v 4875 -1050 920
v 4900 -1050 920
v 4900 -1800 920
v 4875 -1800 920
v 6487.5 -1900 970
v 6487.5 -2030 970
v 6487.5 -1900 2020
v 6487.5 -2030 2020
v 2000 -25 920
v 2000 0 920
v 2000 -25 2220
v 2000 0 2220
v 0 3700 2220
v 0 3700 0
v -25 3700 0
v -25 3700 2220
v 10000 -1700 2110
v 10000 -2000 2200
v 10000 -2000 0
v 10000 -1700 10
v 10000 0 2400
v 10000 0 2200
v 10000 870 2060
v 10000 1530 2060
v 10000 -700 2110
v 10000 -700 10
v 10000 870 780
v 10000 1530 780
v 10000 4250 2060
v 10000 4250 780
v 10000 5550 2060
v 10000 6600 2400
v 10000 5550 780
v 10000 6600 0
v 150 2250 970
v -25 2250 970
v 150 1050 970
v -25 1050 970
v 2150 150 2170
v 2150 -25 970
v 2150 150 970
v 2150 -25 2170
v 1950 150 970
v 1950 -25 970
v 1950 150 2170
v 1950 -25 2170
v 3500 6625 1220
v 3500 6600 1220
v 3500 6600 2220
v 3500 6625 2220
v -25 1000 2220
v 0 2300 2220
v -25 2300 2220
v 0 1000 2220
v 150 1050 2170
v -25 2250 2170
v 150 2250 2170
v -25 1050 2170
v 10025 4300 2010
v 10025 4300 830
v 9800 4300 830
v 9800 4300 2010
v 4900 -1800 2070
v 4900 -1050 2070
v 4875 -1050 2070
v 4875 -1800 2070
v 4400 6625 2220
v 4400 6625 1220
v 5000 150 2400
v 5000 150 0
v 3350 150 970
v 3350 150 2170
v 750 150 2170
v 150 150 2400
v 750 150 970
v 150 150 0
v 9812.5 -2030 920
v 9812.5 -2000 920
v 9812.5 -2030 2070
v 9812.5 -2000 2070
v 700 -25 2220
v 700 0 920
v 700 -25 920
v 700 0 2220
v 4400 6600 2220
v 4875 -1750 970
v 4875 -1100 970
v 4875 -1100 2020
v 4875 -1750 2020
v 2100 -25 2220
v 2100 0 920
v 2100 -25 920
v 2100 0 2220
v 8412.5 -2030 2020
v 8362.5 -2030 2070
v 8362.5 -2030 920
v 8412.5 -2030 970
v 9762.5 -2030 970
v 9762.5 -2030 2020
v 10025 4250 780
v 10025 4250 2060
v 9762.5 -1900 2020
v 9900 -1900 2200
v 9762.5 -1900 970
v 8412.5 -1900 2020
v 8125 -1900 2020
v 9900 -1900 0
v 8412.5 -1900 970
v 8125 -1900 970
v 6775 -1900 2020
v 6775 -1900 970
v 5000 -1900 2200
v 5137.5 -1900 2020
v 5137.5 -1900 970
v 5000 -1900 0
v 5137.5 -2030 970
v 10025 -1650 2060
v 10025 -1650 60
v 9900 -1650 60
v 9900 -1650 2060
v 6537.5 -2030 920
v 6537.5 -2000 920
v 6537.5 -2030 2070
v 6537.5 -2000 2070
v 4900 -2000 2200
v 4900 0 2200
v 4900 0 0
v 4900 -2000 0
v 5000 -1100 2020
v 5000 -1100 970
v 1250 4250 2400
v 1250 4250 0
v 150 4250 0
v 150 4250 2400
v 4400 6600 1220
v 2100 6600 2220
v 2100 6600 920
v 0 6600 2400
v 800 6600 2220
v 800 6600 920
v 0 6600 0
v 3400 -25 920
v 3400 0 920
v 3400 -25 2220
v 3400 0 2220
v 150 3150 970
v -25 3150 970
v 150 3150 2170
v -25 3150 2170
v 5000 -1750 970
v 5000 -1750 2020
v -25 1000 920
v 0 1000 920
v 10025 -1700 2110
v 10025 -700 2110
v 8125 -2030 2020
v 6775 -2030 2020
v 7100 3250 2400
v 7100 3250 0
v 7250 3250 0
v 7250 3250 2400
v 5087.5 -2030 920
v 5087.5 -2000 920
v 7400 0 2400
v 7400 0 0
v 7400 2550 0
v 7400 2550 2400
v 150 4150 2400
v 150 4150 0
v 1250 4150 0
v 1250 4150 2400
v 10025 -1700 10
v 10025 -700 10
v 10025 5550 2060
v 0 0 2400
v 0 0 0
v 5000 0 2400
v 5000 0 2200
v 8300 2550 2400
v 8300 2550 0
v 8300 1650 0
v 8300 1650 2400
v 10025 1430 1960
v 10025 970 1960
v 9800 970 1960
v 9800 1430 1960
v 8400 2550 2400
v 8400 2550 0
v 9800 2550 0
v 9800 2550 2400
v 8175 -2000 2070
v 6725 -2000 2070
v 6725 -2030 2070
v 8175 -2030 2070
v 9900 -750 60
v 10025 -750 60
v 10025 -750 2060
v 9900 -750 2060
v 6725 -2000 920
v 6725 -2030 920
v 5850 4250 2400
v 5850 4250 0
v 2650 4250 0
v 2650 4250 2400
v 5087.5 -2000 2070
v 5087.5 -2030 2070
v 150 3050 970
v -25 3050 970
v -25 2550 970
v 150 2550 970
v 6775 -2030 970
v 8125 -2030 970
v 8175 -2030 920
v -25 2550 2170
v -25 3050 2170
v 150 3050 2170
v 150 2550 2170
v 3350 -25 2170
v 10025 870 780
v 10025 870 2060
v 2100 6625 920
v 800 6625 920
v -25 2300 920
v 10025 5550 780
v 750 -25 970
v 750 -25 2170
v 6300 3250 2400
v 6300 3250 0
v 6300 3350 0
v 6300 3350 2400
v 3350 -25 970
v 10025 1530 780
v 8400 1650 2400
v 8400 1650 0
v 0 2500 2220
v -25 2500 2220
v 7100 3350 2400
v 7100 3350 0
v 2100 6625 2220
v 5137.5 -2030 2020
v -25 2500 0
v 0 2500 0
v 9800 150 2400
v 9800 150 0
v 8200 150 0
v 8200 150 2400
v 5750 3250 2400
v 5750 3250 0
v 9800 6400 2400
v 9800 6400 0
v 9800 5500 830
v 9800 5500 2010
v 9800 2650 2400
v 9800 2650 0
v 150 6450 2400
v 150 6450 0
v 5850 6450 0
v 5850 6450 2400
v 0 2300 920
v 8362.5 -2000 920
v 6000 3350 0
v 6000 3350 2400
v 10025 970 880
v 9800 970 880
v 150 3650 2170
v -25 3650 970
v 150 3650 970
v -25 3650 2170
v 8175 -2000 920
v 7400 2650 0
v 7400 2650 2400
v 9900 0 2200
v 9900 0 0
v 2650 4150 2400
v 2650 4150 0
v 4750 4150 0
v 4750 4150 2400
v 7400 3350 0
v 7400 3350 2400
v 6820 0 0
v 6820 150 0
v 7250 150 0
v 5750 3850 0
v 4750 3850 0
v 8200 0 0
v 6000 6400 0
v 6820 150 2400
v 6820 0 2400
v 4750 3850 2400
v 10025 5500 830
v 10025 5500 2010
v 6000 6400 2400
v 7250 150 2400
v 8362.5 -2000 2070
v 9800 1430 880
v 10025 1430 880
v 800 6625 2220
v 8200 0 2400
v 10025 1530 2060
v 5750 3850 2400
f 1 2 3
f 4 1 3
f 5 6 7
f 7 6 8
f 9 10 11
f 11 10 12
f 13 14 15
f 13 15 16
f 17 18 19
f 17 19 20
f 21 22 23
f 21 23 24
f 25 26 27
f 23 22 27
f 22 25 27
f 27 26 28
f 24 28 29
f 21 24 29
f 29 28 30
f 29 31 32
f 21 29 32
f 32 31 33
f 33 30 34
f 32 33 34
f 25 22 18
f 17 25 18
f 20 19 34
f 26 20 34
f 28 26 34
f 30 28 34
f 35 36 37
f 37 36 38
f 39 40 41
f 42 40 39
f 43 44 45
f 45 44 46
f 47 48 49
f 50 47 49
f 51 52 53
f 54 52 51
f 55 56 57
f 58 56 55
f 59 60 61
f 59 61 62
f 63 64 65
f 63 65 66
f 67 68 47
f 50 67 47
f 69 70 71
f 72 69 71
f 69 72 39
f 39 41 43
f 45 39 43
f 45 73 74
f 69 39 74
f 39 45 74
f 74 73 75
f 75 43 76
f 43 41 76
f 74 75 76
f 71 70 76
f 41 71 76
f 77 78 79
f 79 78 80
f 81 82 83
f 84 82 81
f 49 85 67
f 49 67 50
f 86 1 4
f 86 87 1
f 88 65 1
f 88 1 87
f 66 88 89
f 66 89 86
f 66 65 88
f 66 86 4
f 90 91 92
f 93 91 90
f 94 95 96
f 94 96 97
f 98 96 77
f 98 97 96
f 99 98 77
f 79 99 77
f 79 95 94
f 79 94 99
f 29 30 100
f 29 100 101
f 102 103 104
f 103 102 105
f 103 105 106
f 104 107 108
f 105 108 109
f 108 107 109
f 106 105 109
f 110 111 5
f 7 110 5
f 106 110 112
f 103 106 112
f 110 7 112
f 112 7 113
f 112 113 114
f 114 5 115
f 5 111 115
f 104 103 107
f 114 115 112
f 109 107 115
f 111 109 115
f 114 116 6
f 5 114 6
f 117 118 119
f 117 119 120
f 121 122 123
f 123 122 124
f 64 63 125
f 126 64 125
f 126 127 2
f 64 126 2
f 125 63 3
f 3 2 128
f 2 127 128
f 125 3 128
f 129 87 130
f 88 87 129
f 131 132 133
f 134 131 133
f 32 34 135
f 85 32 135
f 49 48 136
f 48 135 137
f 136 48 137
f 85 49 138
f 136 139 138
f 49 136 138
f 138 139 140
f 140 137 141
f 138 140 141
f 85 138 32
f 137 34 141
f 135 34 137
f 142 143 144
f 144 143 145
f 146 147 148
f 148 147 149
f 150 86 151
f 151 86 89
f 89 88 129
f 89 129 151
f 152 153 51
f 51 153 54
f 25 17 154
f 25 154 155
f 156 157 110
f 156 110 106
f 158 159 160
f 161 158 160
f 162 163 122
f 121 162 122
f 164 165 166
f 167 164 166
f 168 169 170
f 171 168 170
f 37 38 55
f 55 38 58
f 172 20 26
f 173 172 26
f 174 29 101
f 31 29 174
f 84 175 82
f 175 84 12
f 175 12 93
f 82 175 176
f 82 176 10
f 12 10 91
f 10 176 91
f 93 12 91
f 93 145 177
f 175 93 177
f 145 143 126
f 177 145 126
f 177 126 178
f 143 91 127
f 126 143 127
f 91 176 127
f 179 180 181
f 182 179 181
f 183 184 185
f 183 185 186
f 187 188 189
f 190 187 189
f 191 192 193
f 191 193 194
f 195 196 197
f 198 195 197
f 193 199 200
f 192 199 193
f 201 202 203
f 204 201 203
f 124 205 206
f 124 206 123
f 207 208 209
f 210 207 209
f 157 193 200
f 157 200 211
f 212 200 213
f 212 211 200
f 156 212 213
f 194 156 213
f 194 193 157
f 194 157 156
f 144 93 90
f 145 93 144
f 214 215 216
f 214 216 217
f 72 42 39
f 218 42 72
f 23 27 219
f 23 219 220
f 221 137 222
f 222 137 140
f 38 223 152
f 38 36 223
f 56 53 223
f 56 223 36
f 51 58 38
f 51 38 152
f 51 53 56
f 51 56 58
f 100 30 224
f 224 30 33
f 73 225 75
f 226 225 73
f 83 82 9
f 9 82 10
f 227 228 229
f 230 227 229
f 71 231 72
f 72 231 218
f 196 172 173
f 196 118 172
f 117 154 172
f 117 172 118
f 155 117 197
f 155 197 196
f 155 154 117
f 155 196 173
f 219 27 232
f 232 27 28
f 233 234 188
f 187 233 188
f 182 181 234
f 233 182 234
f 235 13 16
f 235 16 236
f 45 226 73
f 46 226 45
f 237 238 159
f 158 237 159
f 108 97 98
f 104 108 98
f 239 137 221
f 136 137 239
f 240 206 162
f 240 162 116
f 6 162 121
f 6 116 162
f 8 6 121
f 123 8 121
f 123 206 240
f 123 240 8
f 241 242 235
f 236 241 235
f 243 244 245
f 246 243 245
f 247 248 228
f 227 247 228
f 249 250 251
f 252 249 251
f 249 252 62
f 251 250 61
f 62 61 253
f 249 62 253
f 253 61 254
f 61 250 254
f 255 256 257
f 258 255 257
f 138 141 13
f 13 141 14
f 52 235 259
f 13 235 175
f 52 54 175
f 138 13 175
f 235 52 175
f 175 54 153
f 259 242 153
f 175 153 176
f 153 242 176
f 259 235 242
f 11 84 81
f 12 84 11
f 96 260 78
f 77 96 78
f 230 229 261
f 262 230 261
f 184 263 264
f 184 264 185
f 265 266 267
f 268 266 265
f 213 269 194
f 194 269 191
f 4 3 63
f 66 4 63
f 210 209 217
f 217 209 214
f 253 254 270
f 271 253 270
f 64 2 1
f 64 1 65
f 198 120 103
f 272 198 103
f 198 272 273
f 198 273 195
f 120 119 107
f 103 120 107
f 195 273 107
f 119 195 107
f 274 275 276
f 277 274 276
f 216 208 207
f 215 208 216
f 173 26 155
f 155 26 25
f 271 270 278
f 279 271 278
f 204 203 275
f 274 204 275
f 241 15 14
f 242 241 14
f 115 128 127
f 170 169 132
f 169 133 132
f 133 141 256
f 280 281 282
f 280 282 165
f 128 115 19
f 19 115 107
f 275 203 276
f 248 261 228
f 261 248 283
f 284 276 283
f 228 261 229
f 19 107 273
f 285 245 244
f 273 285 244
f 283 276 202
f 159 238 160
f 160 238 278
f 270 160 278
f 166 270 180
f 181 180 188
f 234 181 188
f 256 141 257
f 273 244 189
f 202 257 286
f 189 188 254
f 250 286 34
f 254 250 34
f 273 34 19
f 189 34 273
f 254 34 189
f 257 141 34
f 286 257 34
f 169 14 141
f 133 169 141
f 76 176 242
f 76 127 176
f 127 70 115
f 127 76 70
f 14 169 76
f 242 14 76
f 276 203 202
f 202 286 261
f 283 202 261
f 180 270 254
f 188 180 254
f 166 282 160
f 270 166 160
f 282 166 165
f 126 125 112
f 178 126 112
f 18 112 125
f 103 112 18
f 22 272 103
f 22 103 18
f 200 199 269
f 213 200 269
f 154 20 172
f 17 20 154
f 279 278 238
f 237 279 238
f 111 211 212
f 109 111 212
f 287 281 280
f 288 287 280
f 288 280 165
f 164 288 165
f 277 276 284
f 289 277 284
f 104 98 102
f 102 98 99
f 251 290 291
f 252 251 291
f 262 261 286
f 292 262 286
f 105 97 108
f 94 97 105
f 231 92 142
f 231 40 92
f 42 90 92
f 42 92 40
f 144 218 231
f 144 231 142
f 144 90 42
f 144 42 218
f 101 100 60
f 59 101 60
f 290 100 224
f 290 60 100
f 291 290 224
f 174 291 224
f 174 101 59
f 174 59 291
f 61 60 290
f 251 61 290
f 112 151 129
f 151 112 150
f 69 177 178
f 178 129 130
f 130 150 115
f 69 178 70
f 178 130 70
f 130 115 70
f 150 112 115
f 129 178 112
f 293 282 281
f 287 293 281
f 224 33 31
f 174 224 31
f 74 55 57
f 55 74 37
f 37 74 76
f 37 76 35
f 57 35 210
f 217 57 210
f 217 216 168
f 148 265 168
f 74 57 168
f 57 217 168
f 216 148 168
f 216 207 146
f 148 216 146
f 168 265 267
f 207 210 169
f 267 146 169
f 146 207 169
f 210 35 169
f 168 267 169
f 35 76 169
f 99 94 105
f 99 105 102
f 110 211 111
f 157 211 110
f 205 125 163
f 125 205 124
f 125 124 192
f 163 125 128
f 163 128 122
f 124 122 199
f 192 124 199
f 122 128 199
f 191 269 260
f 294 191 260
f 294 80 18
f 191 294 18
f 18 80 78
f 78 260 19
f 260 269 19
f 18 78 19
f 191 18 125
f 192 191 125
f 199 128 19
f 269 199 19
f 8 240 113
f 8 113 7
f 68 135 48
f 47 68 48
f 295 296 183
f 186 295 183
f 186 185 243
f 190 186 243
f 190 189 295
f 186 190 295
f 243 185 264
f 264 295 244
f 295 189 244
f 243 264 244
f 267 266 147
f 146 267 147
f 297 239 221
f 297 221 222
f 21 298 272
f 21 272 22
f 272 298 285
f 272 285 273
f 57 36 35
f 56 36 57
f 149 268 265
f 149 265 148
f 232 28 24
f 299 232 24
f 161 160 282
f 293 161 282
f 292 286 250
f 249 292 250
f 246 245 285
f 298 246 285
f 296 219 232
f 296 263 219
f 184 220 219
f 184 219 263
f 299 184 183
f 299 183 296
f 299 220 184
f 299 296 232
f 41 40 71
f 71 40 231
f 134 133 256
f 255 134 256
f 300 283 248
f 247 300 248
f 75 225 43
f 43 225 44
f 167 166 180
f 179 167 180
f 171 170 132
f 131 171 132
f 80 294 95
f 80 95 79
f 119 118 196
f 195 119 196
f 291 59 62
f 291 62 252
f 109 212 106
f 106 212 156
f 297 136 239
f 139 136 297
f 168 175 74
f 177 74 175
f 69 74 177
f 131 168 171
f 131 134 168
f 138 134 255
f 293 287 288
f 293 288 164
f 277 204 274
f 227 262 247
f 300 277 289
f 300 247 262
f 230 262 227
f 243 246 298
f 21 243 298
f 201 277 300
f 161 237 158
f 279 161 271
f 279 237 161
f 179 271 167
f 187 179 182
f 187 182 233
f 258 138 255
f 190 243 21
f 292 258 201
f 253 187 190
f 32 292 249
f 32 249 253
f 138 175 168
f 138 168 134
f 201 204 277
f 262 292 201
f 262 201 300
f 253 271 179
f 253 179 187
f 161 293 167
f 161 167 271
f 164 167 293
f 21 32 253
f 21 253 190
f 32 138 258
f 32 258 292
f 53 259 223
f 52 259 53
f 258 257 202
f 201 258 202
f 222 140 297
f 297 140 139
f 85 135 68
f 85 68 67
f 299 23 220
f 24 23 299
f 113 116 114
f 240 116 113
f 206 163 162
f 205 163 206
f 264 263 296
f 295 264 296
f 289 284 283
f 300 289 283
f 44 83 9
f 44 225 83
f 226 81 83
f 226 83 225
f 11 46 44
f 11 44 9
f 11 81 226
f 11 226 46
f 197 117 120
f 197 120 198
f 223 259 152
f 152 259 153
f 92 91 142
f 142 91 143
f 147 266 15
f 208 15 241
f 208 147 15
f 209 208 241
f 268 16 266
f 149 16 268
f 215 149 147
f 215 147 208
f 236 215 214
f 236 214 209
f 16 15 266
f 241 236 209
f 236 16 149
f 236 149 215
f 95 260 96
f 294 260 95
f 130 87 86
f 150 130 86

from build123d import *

# Parameters (mm, degrees)
F1_DEPTH  = 2400
F3_DEPTH  = 2200
F4_W      = 1450
F4_H      = 1150
F5_DEPTH  = 30
F6_W      = 1350
F6_H      = 1050
F7_DEPTH  = 130
F8_W      = 1000
F8_H      = 2100
F9_DEPTH  = 25
F10_W     = 900
F10_H     = 2000
F11_DEPTH = 125
F12_W     = 750
F12_H     = 1150
F13_DEPTH = 25
F14_W     = 650
F14_H     = 1050
F15_DEPTH = 125
F16_W     = 660
F16_H     = 1280
F17_DEPTH = 25
F18_W     = 460
F18_H     = 1080
F19_DEPTH = 225
F20_W     = 1300
F20_H     = 1280
F21_DEPTH = 25
F22_W     = 1200
F22_H     = 1180
F23_DEPTH = 225
F24_W     = 1300
F24_H     = 1300
F25_DEPTH = 25
F26_W     = 1200
F26_H     = 1200
F27_DEPTH = 175
F28_W     = 1300
F28_H     = 1300
F28_W_2   = 900
F28_H_2   = 1000
F29_DEPTH = 25
F30_W     = 1300
F30_H     = 1300
F30_W_2   = 1200
F30_H_2   = 2220
F31_DEPTH = 25
F32_W     = 1200
F32_H     = 1200
F32_W_2   = 500
F33_DEPTH = 175


with BuildPart() as f1:
    # F0 (on Top) → F1 (new body)
    with BuildSketch(Plane.XY):
        Polygon((0, 6600), (0, 0), (5000, 0), (5000, 150), (150, 150), (150, 4150), (1250, 4150), (1250, 4250), (150, 4250), (150, 6450), (5850, 6450), (5850, 4250), (2650, 4250), (2650, 4150), (4750, 4150), (4750, 3850), (5750, 3850), (5750, 3250), (6300, 3250), (6300, 3350), (6000, 3350), (6000, 6400), (9800, 6400), (9800, 2650), (7400, 2650), (7400, 3350), (7100, 3350), (7100, 3250), (7250, 3250), (7250, 150), (6820, 150), (6820, 0), (7400, 0), (7400, 2550), (8300, 2550), (8300, 1650), (8400, 1650), (8400, 2550), (9800, 2550), (9800, 150), (8200, 150), (8200, 0), (10000, 0), (10000, 6600), align=None)
    extrude(amount=F1_DEPTH)

    # F2 (on Top) → F3 (join)
    with BuildSketch(Plane.XY):
        Polygon((10000, -2000), (10000, 0), (9900, 0), (9900, -1900), (5000, -1900), (5000, 0), (4900, 0), (4900, -2000), align=None)
    extrude(amount=F3_DEPTH)

    # F4 (on face) → F5 (join)
    with BuildSketch(Plane.XZ.offset(2000)):
        with Locations((5812.5, 1495)):
            Rectangle(F4_W, F4_H)
        with Locations((7450, 1495)):
            Rectangle(F4_W, F4_H)
        with Locations((9087.5, 1495)):
            Rectangle(F4_W, F4_H)
    extrude(amount=F5_DEPTH)

    # F6 (on face) → F7 (cut, through all)
    with BuildSketch(Plane.XZ.offset(2030)):
        with Locations((5812.5, 1495)):
            Rectangle(F6_W, F6_H)
        with Locations((7450, 1495)):
            Rectangle(F6_W, F6_H)
        with Locations((9087.5, 1495)):
            Rectangle(F6_W, F6_H)
    extrude(amount=-F7_DEPTH, mode=Mode.SUBTRACT)

    # F8 (on face) → F9 (join)
    with BuildSketch(Plane.YZ.offset(10000)):
        with Locations((-1200, 1060)):
            Rectangle(F8_W, F8_H)
    extrude(amount=F9_DEPTH)

    # F10 (on face) → F11 (cut)
    with BuildSketch(Plane.YZ.offset(10025)):
        with Locations((-1200, 1060)):
            Rectangle(F10_W, F10_H)
    extrude(amount=-F11_DEPTH, mode=Mode.SUBTRACT)

    # F12 (on face) → F13 (join)
    with BuildSketch(Plane(origin=(4900, 0, 0), x_dir=(0, -1, 0), z_dir=(-1, 0, 0))):
        with Locations((1425, 1495)):
            Rectangle(F12_W, F12_H)
    extrude(amount=F13_DEPTH)

    # F14 (on face) → F15 (cut, through all)
    with BuildSketch(Plane(origin=(4875, 0, 0), x_dir=(0, -1, 0), z_dir=(-1, 0, 0))):
        with Locations((1425, 1495)):
            Rectangle(F14_W, F14_H)
    extrude(amount=-F15_DEPTH, mode=Mode.SUBTRACT)

    # F16 (on face) → F17 (join)
    with BuildSketch(Plane.YZ.offset(10000)):
        with Locations((1200, 1420)):
            Rectangle(F16_W, F16_H)
    extrude(amount=F17_DEPTH)

    # F18 (on face) → F19 (cut, through all)
    with BuildSketch(Plane.YZ.offset(10025)):
        with Locations((1200, 1420)):
            Rectangle(F18_W, F18_H)
    extrude(amount=-F19_DEPTH, mode=Mode.SUBTRACT)

    # F20 (on face) → F21 (join)
    with BuildSketch(Plane.YZ.offset(10000)):
        with Locations((4900, 1420)):
            Rectangle(F20_W, F20_H)
    extrude(amount=F21_DEPTH)

    # F22 (on face) → F23 (cut, through all)
    with BuildSketch(Plane.YZ.offset(10025)):
        with Locations((4900, 1420)):
            Rectangle(F22_W, F22_H)
    extrude(amount=-F23_DEPTH, mode=Mode.SUBTRACT)

    # F24 (on face) → F25 (join)
    with BuildSketch(Plane.XZ):
        with Locations((2750, 1570)):
            Rectangle(F24_W, F24_H)
        with Locations((1350, 1570)):
            Rectangle(F24_W, F24_H)
    extrude(amount=F25_DEPTH)

    # F26 (on face) → F27 (cut, through all)
    with BuildSketch(Plane.XZ.offset(25)):
        with Locations((2750, 1570)):
            Rectangle(F26_W, F26_H)
        with Locations((1350, 1570)):
            Rectangle(F26_W, F26_H)
    extrude(amount=-F27_DEPTH, mode=Mode.SUBTRACT)

    # F28 (on face) → F29 (join)
    with BuildSketch(Plane(origin=(0, 6600, 0), x_dir=(-1, 0, 0), z_dir=(0, 1, 0))):
        with Locations((-1450, 1570)):
            Rectangle(F28_W, F28_H)
        with Locations((-3950, 1720)):
            Rectangle(F28_W_2, F28_H_2)
    extrude(amount=F29_DEPTH)

    # F30 (on face) → F31 (join)
    with BuildSketch(Plane(origin=(0, 0, 0), x_dir=(0, -1, 0), z_dir=(-1, 0, 0))):
        with Locations((-1650, 1570)):
            Rectangle(F30_W, F30_H)
        with Locations((-3100, 1110)):
            Rectangle(F30_W_2, F30_H_2)
    extrude(amount=F31_DEPTH)

    # F32 (on face) → F33 (cut, through all)
    with BuildSketch(Plane(origin=(-25, 0, 0), x_dir=(0, -1, 0), z_dir=(-1, 0, 0))):
        with Locations((-1650, 1570)):
            Rectangle(F32_W, F32_H)
        with Locations((-2800, 1570)):
            Rectangle(F32_W_2, F32_H)
        with Locations((-3400, 1570)):
            Rectangle(F32_W_2, F32_H)
    extrude(amount=-F33_DEPTH, mode=Mode.SUBTRACT)


solid = f1.part
